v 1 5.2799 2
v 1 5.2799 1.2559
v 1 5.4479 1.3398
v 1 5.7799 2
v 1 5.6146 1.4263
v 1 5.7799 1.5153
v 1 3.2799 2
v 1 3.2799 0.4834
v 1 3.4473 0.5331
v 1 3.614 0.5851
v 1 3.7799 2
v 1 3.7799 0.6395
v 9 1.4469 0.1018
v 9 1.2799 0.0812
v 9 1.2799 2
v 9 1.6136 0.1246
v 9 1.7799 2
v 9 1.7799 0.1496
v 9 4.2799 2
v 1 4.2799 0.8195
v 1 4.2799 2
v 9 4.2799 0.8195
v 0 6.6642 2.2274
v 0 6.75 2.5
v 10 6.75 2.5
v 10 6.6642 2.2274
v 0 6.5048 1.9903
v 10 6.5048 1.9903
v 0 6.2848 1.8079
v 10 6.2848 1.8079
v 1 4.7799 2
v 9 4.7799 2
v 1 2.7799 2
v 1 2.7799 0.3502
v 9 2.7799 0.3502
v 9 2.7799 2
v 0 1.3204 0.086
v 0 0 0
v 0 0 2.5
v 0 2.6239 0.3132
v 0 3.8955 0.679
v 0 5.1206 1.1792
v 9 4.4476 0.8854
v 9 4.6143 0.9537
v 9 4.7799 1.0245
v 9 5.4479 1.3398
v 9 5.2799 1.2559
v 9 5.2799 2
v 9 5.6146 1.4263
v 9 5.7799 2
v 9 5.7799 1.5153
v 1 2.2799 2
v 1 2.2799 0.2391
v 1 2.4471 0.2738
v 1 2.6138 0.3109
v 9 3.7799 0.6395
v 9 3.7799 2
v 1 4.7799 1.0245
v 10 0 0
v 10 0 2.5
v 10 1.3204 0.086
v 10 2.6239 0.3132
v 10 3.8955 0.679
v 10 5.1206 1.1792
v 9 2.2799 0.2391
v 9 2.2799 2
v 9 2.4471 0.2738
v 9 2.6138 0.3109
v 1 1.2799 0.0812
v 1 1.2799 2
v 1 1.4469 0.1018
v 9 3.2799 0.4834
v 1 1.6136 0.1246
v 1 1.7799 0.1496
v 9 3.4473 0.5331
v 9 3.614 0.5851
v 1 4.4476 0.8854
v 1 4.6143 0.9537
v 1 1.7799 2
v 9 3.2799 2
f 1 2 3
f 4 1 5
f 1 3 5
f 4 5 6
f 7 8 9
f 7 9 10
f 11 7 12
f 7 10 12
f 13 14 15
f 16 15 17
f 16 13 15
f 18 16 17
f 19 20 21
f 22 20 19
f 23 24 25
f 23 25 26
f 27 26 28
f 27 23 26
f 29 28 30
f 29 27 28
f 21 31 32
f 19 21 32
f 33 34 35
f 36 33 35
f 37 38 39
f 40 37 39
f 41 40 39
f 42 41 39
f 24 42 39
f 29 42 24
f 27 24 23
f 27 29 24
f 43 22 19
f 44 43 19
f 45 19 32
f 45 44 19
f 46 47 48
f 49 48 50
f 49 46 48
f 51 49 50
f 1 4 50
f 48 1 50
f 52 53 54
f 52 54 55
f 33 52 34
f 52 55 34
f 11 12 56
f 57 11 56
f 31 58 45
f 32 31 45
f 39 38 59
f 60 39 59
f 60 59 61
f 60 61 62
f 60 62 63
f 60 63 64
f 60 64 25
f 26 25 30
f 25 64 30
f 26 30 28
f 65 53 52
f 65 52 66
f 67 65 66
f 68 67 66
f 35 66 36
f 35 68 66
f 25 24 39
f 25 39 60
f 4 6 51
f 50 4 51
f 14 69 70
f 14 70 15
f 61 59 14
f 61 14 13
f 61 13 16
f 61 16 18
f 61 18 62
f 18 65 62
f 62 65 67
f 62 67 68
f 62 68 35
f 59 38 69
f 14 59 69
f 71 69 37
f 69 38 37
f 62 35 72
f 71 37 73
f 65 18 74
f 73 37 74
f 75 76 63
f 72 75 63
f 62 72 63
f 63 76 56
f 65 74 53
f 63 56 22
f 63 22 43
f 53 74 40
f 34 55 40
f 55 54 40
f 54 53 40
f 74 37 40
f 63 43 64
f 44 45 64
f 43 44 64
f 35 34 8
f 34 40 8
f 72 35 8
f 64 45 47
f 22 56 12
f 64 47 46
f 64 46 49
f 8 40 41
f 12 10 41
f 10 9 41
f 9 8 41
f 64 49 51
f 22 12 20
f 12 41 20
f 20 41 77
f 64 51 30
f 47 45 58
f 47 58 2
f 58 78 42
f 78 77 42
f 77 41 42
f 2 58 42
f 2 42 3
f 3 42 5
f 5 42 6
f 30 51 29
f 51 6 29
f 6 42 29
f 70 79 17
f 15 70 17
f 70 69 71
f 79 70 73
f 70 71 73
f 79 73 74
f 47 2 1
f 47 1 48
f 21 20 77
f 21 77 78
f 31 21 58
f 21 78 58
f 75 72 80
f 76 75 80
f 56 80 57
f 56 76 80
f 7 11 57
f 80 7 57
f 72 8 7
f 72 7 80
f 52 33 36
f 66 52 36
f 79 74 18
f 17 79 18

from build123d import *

# Parameters (mm, degrees)
F0_W        = 10
F0_H        = 7.142
F1_DEPTH    = 2.5
F3_DEPTH    = 10.001
F4_T1_DEPTH = 12.7651557864
F6_W        = 8
F6_H        = 0.5
F7_DEPTH    = 2


# Not quite as in the source:
# - a fillet or chamfer that OpenCascade refuses, or shapes differently, is made with other operations: its cross-section is extruded or revolved along the edge and cut away or added


with BuildPart() as f1:
    # F0 (on Top) → F1 (new body)
    with BuildSketch(Plane.XY):
        with Locations((5, 3.571)):
            Rectangle(F0_W, F0_H)
    extrude(amount=F1_DEPTH)

    # F2 (on face) → F3 (cut, through all)
    with BuildSketch(Plane(origin=(0, 0, 0), x_dir=(0, -1, 0), z_dir=(-1, 0, 0))):
        with BuildLine():
            ThreePointArc((0, 0), (-3.5295320322, 0.5584308586), (-6.75, 2.106987431))
            Line((-6.75, 2.106987431), (-6.75, 12.27143))
            Line((-6.75, 12.27143), (-9.8289949819, -2.3460234515))
            Line((-9.8289949819, -2.3460234515), (0, 0))
        make_face()
    extrude(amount=-F3_DEPTH, mode=Mode.SUBTRACT)

    # F4: fillet of radius 1 on 1 edges, made by hand

    # F4_s2 → F4_t1 (cut)
    with BuildSketch(Plane.YZ.offset(-1.3825778932)):
        with BuildLine():
            ThreePointArc((6.75, 2.5), (6.5929931831, 2.1031503004), (6.2848187014, 1.8079058028))
            ThreePointArc((6.2848187014, 1.8079058028), (6.5190889746, 1.9548341876), (6.75, 2.106987431))
            Line((6.75, 2.106987431), (6.75, 2.5))
        make_face()
    extrude(amount=F4_T1_DEPTH, mode=Mode.SUBTRACT)

    # F6 (on offset) → F7 (cut)
    with BuildSketch(Plane.XY):
        with Locations((5, 4.5299213873)):
            Rectangle(F6_W, F6_H)
        with Locations((5, 3.5299213873)):
            Rectangle(F6_W, F6_H)
        with Locations((5, 2.5299213873)):
            Rectangle(F6_W, F6_H)
        with Locations((5, 1.5299213873)):
            Rectangle(F6_W, F6_H)
        with Locations((5, 5.5299213873)):
            Rectangle(F6_W, F6_H)
    extrude(amount=F7_DEPTH, mode=Mode.SUBTRACT)


solid = f1.part
